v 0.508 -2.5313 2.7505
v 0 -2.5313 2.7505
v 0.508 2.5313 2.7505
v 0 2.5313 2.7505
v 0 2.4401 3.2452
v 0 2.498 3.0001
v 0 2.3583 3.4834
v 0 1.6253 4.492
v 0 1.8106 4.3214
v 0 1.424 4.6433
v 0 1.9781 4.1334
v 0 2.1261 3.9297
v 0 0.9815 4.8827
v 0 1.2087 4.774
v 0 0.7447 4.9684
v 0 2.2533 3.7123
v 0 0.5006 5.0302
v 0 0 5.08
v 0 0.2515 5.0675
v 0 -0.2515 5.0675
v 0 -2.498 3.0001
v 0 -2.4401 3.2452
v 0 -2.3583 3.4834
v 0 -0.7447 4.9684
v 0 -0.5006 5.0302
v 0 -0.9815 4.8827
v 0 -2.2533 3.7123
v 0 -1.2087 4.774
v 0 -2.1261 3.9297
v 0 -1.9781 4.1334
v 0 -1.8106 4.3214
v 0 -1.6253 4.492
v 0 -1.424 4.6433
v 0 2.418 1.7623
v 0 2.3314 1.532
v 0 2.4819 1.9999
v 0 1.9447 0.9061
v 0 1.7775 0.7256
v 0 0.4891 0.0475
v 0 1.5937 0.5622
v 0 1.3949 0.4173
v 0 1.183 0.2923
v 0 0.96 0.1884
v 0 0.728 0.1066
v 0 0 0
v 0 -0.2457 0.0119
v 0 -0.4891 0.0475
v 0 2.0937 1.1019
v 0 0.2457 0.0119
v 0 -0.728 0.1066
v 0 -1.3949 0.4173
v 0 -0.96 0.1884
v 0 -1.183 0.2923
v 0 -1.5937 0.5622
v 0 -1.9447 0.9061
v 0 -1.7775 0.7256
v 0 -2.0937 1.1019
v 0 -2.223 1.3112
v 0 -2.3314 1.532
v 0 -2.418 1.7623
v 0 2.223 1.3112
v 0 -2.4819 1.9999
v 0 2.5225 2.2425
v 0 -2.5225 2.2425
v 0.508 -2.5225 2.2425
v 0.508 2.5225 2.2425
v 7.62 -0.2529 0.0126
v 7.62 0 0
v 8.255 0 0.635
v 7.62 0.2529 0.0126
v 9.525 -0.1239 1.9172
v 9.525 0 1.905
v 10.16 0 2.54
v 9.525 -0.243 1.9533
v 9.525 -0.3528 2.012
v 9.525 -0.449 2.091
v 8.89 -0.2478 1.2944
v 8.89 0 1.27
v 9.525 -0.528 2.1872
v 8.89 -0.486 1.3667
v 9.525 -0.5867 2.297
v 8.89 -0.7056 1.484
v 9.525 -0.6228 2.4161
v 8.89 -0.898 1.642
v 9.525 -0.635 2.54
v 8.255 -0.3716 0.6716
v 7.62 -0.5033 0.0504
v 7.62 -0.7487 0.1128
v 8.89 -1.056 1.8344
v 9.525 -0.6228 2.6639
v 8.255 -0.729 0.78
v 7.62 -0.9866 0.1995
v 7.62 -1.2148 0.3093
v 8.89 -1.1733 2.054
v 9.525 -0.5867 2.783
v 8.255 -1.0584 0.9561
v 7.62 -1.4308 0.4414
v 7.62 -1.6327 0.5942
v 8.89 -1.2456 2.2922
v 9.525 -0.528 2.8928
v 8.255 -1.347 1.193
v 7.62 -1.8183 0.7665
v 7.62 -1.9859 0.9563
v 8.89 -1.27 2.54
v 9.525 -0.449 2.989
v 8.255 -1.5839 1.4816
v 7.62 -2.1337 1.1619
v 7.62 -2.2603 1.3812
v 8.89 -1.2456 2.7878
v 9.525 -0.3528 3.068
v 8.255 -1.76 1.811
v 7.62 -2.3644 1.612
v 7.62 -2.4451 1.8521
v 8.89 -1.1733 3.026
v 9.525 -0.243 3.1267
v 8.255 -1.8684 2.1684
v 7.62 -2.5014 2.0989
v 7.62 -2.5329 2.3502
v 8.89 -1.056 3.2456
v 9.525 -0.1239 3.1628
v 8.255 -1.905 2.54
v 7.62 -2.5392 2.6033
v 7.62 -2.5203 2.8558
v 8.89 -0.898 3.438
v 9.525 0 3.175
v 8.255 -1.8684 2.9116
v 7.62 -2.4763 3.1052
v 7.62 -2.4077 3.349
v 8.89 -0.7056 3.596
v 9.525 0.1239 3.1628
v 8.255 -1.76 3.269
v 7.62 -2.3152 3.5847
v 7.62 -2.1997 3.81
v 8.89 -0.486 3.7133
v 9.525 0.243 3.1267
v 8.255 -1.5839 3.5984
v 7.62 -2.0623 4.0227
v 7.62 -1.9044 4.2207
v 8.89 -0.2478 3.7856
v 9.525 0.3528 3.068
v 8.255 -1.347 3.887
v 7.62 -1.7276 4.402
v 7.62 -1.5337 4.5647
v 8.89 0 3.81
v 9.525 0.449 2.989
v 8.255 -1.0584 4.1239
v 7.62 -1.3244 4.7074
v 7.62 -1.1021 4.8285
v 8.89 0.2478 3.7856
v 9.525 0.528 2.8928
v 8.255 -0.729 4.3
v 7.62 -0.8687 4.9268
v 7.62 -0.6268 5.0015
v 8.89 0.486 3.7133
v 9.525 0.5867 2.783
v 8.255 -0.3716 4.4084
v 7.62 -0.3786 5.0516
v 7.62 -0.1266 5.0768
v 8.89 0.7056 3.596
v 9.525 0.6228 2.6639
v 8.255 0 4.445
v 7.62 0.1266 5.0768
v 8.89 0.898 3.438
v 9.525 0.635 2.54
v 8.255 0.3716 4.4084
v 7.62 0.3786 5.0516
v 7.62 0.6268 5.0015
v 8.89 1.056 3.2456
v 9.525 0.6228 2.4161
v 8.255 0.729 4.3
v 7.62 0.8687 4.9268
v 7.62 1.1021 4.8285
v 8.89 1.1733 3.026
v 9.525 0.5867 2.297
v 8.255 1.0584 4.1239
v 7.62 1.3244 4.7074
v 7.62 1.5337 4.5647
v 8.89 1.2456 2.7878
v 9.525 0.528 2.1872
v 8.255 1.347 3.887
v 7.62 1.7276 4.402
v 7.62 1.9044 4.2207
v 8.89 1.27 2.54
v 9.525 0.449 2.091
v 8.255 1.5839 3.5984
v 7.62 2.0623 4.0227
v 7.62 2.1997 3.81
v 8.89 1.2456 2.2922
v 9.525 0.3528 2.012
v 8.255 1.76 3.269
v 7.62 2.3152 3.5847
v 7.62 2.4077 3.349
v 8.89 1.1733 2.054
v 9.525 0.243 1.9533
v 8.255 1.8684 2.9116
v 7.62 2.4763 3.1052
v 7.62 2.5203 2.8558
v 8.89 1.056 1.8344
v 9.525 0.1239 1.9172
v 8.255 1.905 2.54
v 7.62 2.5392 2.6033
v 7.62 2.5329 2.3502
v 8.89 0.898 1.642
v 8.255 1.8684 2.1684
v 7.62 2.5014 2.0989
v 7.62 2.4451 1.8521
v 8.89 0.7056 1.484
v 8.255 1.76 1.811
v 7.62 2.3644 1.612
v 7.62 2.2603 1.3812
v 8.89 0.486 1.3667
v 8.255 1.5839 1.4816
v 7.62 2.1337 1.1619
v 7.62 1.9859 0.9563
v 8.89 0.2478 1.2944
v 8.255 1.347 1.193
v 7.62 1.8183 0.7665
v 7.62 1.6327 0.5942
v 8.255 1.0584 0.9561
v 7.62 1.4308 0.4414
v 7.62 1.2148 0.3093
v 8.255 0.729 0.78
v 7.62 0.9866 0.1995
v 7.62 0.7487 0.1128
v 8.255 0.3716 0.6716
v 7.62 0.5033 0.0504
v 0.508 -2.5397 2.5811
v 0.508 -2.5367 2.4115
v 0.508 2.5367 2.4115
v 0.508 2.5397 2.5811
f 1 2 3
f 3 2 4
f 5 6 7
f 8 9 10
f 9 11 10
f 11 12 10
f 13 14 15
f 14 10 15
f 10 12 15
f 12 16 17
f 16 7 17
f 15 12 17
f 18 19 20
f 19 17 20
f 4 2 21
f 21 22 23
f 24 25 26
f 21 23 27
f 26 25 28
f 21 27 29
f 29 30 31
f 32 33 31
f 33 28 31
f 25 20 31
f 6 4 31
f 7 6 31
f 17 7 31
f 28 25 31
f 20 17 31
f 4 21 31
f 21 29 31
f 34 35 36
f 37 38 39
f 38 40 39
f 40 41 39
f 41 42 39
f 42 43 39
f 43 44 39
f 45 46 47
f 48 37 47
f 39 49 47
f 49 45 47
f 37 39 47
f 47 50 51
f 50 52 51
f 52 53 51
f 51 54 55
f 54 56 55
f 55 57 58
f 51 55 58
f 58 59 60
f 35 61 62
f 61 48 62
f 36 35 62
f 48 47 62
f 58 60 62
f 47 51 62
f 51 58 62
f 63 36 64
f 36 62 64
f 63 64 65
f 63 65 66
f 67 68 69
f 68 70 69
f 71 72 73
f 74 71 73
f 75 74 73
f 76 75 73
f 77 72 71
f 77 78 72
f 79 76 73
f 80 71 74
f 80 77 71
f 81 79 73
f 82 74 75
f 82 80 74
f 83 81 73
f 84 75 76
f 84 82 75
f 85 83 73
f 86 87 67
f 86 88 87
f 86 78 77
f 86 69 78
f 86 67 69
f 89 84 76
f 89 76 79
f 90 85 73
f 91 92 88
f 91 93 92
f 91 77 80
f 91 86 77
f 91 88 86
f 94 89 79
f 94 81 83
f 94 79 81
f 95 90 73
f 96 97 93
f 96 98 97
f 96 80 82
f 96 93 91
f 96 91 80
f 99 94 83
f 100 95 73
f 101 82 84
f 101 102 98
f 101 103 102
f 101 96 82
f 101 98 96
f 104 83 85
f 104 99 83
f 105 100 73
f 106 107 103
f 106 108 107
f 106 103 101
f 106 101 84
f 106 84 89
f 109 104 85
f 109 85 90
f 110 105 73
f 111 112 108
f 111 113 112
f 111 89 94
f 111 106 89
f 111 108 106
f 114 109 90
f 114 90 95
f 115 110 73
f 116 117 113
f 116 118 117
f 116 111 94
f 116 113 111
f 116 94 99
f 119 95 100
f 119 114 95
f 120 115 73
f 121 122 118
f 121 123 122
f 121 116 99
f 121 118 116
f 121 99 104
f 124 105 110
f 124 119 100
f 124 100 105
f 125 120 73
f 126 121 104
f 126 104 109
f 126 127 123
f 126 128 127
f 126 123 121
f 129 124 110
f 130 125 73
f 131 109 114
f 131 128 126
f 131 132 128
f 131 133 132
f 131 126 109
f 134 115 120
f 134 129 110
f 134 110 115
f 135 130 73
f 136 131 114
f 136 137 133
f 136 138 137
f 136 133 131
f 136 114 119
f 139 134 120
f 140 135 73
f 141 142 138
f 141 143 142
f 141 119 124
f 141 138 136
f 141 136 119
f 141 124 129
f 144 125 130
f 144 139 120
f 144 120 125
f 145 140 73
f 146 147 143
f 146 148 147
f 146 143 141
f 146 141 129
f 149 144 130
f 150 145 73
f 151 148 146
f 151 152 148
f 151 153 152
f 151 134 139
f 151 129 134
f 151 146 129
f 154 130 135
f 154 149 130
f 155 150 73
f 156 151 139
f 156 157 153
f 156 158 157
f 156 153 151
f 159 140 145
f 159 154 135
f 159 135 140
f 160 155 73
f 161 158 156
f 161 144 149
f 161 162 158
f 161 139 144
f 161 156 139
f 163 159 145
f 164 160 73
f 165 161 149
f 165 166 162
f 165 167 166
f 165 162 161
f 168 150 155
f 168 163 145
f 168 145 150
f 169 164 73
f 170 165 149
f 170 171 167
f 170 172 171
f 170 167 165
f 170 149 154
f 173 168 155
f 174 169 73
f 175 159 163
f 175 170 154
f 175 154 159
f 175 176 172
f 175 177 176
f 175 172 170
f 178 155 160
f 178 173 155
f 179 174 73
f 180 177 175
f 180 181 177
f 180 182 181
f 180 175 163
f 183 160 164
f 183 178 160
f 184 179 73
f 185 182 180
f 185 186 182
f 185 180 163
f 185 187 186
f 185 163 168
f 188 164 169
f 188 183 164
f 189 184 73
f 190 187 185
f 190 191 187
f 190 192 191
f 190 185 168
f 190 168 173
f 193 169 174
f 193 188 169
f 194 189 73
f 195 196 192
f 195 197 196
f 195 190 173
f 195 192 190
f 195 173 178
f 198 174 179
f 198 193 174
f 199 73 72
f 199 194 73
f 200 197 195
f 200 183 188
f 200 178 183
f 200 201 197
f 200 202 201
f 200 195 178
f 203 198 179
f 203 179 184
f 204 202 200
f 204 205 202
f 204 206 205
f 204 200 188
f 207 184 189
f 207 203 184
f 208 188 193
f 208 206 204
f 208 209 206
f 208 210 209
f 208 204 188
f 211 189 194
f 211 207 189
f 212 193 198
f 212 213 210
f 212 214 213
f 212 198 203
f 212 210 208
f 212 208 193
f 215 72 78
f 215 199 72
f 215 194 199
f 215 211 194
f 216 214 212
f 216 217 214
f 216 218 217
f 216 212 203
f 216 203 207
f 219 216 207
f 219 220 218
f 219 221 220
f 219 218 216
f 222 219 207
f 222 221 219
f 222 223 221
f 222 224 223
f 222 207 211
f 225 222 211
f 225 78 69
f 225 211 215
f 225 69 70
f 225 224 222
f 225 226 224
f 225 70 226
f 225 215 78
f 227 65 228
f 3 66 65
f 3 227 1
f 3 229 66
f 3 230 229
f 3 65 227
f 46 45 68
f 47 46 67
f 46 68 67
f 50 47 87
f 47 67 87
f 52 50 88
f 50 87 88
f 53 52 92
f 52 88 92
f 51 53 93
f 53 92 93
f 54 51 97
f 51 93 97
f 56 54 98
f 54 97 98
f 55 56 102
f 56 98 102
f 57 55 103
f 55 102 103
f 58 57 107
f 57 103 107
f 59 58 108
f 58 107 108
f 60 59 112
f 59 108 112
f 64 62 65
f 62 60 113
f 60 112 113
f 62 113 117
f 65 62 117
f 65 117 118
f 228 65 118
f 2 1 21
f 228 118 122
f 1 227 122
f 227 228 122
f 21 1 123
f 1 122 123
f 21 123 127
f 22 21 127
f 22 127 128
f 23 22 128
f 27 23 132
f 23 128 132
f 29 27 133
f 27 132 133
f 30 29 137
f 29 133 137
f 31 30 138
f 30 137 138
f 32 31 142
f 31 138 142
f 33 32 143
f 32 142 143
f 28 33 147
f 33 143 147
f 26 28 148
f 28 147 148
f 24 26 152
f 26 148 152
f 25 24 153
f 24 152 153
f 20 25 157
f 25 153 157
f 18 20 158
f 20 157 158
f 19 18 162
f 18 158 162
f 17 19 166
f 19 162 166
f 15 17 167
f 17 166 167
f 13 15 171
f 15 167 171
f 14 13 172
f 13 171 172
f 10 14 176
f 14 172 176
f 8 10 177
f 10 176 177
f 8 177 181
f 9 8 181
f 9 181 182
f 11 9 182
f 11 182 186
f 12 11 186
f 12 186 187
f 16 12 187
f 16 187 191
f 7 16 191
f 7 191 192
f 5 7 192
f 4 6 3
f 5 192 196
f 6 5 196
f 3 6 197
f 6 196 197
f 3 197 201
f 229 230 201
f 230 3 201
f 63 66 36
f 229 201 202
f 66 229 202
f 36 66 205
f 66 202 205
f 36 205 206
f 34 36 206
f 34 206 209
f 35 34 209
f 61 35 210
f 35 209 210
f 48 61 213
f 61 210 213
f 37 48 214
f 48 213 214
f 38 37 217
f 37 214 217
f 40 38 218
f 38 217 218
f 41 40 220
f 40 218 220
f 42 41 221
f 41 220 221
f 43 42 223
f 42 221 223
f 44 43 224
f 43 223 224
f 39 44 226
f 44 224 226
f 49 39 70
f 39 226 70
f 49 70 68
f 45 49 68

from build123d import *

# Parameters (mm, degrees)
SKETCH1_W          = 7.62
SKETCH1_H          = 2.54
SKETCH2_W          = 0.508
SKETCH2_H          = 5.430732337
CUT_EXTRUDE1_DEPTH = 0.508


with BuildPart() as part:
    # Sketch1 → Revolve1 (revolve)
    with BuildSketch(Plane(origin=(0, 0, 0), x_dir=(1, 0, 0), z_dir=(0, 1, 0))):
        Polygon((7.62, -2.54), (10.16, -2.54), (7.62, 0), align=None)
        with Locations((3.81, -1.27)):
            Rectangle(SKETCH1_W, SKETCH1_H)
    revolve(axis=Axis((10.16, 0, 2.54), (-1, 0, 0)))

    # Sketch2 → Cut-Extrude1 (cut)
    with BuildSketch(Plane.ZY):
        with Locations((2.496486647, -0.018862031)):
            Rectangle(SKETCH2_W, SKETCH2_H)
    extrude(amount=-CUT_EXTRUDE1_DEPTH, mode=Mode.SUBTRACT)


solid = part.part
